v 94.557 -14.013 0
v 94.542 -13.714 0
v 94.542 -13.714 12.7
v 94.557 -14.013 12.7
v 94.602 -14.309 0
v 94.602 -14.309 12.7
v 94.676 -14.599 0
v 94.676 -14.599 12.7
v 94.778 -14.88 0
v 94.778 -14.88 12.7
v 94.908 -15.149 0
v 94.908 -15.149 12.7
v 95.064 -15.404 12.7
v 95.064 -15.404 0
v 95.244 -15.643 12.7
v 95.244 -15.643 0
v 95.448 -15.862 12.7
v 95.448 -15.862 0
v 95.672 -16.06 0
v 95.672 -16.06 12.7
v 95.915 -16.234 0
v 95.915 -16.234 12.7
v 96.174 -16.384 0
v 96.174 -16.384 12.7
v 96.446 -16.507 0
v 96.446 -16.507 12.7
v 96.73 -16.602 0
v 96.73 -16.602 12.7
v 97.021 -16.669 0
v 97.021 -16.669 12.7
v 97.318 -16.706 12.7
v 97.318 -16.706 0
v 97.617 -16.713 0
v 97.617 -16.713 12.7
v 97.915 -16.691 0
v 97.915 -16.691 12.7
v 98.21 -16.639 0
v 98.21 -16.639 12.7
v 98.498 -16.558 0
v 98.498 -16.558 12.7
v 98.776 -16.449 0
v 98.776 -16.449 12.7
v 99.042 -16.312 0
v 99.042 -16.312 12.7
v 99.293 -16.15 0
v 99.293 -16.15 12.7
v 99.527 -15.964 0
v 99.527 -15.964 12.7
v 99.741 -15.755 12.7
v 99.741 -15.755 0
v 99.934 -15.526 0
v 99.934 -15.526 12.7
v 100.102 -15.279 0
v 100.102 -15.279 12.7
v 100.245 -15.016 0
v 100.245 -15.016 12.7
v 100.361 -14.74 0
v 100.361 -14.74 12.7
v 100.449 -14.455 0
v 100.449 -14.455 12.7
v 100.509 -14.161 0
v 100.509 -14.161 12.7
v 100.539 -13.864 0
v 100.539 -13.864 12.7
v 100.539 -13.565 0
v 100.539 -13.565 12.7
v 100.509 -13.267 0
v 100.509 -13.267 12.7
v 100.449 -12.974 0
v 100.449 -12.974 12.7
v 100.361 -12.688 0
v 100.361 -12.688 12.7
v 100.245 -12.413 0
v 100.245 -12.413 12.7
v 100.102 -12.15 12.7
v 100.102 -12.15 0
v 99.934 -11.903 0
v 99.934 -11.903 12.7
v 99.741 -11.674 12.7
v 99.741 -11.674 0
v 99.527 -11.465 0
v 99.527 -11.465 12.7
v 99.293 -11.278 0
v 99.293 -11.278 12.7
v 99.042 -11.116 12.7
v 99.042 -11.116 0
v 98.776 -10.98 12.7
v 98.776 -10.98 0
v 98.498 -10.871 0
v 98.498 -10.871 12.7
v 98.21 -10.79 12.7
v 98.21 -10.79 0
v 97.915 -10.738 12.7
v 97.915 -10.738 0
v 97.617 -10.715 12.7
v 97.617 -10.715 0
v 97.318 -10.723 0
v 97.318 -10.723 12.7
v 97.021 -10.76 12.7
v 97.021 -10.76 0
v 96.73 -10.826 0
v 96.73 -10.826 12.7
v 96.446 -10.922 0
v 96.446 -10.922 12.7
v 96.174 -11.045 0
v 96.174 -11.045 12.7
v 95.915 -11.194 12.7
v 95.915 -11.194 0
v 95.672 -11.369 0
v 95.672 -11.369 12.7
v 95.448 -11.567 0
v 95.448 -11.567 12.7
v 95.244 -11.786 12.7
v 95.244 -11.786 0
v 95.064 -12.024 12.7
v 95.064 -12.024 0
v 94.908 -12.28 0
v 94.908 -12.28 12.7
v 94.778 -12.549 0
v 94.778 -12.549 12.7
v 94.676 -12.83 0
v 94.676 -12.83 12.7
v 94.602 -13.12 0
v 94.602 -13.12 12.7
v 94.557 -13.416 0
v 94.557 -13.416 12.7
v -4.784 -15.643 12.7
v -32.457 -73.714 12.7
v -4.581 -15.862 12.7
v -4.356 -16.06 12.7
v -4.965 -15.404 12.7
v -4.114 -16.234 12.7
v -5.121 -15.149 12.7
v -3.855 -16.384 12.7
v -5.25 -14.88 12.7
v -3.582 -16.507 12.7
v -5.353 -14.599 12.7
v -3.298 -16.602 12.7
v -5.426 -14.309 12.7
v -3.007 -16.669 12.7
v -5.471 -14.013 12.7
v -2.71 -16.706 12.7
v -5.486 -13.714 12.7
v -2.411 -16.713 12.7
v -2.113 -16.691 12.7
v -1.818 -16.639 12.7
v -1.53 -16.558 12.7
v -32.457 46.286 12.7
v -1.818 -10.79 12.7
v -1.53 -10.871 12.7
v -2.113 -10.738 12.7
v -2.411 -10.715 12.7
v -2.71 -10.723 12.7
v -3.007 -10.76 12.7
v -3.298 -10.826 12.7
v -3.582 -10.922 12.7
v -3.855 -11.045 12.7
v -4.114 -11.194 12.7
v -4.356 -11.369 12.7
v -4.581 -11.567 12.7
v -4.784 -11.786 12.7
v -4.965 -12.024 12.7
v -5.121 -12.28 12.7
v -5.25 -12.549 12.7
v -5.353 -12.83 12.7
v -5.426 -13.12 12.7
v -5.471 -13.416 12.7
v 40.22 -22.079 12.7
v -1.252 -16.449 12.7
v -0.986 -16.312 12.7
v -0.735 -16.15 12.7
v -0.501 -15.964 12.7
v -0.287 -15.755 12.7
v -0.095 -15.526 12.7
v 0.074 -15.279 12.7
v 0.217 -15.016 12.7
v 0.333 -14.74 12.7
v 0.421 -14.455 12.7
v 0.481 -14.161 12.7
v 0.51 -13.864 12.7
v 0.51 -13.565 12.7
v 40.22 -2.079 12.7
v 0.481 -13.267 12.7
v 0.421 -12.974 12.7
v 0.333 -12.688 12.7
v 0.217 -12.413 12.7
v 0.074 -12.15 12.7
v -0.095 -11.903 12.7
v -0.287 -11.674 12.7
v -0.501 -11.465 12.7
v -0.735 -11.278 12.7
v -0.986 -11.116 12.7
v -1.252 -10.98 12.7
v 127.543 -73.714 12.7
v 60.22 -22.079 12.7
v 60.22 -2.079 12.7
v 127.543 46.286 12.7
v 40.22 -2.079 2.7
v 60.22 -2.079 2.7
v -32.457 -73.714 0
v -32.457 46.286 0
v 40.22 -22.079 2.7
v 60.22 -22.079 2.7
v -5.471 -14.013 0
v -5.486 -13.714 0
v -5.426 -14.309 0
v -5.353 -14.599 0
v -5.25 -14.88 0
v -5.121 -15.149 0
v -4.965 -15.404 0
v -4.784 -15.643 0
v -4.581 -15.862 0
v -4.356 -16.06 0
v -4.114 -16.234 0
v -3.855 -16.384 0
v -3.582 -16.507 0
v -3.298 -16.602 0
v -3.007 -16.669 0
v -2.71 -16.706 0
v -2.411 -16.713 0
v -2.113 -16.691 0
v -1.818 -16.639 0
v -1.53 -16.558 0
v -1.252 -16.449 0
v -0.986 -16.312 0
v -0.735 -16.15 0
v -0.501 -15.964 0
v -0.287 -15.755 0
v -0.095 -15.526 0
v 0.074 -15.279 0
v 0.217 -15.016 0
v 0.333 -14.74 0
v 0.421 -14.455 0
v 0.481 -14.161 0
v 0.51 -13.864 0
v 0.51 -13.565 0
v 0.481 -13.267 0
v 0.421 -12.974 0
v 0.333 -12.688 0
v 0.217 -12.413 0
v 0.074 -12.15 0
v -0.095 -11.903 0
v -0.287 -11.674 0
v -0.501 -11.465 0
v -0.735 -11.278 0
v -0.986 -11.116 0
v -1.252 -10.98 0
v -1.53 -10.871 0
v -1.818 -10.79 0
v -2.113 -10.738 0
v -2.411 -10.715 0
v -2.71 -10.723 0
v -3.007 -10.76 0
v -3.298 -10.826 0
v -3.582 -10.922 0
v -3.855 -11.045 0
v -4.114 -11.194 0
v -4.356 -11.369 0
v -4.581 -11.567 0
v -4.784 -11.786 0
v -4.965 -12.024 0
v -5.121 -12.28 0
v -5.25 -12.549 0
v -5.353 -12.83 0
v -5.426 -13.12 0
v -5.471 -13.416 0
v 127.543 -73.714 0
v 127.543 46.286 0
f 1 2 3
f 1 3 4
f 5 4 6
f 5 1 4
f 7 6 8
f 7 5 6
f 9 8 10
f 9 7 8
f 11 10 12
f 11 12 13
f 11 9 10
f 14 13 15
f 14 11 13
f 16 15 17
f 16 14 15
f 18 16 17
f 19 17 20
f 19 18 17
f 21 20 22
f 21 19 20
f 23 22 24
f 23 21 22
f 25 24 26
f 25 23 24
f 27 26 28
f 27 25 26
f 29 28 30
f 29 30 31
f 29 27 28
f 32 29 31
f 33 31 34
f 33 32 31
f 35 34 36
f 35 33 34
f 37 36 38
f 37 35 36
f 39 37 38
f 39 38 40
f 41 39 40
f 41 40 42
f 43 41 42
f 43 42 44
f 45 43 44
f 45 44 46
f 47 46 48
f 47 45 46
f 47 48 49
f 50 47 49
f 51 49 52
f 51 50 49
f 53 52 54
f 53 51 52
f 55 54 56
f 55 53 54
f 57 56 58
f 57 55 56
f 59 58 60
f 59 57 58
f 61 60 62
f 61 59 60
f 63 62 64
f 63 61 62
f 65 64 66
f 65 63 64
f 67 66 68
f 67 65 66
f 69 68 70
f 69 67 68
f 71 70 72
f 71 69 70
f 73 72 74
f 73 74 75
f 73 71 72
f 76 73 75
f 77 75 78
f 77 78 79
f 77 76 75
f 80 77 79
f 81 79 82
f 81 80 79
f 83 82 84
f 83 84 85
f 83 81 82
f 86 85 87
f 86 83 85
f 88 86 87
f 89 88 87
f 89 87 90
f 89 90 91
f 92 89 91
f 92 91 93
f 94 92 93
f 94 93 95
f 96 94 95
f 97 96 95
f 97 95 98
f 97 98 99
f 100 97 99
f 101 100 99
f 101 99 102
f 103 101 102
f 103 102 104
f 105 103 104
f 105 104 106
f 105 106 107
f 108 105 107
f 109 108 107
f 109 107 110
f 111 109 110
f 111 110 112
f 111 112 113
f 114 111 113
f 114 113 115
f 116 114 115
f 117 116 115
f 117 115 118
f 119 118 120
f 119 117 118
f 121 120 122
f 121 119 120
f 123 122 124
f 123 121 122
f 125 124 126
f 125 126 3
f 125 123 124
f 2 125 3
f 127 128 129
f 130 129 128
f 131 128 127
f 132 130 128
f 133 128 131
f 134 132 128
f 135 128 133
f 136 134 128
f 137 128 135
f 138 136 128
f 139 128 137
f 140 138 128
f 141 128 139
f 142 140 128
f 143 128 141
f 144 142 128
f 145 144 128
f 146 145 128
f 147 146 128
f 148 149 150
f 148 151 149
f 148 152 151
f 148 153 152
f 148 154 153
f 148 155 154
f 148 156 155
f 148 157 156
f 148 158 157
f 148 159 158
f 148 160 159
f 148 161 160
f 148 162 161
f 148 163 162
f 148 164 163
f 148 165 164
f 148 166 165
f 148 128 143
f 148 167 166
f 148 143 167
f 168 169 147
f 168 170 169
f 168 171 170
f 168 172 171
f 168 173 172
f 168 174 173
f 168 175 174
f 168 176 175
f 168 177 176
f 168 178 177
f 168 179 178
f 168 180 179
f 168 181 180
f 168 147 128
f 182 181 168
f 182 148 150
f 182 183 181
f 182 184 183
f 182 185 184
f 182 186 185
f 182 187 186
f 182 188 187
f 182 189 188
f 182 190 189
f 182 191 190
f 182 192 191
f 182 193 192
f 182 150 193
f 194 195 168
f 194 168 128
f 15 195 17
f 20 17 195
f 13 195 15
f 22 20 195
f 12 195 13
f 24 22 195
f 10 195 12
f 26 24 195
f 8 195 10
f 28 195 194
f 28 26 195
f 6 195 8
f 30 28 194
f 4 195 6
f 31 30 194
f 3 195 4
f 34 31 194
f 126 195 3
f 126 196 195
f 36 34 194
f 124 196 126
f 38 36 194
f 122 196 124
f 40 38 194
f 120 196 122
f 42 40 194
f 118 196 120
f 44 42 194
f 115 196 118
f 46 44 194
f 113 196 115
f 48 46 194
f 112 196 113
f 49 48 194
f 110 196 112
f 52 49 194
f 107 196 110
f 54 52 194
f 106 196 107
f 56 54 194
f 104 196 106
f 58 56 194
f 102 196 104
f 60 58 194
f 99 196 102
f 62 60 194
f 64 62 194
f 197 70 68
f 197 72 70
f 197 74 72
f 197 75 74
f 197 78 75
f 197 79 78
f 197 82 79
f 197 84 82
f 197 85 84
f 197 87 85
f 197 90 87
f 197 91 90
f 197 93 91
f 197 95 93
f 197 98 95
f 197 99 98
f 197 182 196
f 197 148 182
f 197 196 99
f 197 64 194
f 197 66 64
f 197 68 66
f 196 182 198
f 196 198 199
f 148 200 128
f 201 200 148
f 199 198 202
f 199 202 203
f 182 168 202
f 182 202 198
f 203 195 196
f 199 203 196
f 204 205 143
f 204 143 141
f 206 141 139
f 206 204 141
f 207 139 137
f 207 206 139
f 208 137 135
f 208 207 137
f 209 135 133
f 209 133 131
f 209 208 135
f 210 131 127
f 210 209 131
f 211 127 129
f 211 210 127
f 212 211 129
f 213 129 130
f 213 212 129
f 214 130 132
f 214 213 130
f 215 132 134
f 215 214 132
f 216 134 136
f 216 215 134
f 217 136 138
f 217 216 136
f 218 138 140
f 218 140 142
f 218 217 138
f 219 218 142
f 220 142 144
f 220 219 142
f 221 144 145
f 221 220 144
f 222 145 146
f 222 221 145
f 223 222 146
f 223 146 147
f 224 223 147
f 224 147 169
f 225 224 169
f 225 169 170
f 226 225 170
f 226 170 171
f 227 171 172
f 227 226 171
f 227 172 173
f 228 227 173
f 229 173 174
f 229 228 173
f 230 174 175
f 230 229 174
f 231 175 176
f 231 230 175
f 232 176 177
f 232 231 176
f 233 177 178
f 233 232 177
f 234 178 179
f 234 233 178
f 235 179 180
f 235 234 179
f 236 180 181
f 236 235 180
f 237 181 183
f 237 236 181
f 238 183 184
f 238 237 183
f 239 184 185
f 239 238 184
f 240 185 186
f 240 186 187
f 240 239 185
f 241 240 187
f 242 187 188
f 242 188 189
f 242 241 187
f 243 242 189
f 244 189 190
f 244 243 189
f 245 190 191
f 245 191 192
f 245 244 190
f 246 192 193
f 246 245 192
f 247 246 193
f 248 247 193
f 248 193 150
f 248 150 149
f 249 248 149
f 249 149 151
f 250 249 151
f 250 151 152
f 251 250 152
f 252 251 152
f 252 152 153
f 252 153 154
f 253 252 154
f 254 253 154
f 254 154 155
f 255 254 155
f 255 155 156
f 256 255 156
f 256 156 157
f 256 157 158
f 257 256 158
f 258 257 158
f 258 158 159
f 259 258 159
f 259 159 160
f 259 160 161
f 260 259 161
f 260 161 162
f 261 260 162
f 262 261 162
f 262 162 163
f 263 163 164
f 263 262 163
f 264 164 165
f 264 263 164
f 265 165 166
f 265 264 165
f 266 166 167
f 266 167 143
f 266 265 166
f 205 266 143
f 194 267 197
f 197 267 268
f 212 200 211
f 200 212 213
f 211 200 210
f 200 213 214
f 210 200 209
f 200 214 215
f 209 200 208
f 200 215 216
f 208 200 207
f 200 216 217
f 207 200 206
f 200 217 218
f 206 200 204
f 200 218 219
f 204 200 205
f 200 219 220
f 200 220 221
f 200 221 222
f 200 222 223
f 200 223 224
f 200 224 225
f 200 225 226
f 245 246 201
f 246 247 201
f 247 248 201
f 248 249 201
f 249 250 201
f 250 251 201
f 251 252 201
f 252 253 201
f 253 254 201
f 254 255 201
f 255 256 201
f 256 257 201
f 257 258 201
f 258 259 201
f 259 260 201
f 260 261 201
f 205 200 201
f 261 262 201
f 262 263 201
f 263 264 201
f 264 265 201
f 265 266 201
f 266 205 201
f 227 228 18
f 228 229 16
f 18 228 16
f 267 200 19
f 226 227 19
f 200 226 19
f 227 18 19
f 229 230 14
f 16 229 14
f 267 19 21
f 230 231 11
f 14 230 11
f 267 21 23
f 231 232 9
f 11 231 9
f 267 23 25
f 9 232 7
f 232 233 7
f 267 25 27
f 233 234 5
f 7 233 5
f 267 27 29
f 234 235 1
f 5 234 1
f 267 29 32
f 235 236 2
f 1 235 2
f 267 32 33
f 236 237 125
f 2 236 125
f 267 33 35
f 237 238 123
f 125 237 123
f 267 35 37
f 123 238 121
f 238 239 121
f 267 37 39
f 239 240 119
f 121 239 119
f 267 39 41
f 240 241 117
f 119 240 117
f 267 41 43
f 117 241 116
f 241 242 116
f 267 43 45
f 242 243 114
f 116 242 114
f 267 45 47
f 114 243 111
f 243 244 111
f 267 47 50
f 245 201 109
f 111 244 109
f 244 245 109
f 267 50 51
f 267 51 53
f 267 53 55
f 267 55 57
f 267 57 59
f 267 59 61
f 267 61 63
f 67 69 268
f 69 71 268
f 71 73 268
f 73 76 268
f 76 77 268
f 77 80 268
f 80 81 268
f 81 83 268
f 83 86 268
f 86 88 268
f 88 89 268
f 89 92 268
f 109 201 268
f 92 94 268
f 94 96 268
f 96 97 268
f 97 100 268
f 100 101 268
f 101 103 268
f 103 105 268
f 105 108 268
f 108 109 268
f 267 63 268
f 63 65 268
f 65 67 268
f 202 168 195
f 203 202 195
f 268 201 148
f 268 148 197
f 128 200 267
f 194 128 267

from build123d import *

# Parameters (mm, degrees)
SKETCH1_W           = 159.999934
SKETCH1_H           = 120
SKETCH1_R           = 3
BOSS_EXTRUDE1_DEPTH = 12.7
SKETCH3_W           = 20
SKETCH3_H           = 20
CUT_EXTRUDE3_DEPTH  = 10


with BuildPart() as part:
    # Sketch1 → Boss-Extrude1 (new body)
    with BuildSketch(Plane.XY):
        with Locations((47.542890143, -13.714285714)):
            Rectangle(SKETCH1_W, SKETCH1_H)
        with Locations(Location((97.542231184, -13.714285714, 0), (0, 0, 180))):
            Circle(SKETCH1_R, mode=Mode.SUBTRACT)
        with Locations(Location((-2.485927723, -13.714285714, 0), (0, 0, 180))):
            Circle(SKETCH1_R, mode=Mode.SUBTRACT)
    extrude(amount=BOSS_EXTRUDE1_DEPTH)

    # Sketch3 → Cut-Extrude3 (cut)
    with BuildSketch(Plane.XY.offset(12.7)):
        with Locations((50.220438118, -12.079110468)):
            Rectangle(SKETCH3_W, SKETCH3_H)
    extrude(amount=-CUT_EXTRUDE3_DEPTH, mode=Mode.SUBTRACT)


solid = part.part
